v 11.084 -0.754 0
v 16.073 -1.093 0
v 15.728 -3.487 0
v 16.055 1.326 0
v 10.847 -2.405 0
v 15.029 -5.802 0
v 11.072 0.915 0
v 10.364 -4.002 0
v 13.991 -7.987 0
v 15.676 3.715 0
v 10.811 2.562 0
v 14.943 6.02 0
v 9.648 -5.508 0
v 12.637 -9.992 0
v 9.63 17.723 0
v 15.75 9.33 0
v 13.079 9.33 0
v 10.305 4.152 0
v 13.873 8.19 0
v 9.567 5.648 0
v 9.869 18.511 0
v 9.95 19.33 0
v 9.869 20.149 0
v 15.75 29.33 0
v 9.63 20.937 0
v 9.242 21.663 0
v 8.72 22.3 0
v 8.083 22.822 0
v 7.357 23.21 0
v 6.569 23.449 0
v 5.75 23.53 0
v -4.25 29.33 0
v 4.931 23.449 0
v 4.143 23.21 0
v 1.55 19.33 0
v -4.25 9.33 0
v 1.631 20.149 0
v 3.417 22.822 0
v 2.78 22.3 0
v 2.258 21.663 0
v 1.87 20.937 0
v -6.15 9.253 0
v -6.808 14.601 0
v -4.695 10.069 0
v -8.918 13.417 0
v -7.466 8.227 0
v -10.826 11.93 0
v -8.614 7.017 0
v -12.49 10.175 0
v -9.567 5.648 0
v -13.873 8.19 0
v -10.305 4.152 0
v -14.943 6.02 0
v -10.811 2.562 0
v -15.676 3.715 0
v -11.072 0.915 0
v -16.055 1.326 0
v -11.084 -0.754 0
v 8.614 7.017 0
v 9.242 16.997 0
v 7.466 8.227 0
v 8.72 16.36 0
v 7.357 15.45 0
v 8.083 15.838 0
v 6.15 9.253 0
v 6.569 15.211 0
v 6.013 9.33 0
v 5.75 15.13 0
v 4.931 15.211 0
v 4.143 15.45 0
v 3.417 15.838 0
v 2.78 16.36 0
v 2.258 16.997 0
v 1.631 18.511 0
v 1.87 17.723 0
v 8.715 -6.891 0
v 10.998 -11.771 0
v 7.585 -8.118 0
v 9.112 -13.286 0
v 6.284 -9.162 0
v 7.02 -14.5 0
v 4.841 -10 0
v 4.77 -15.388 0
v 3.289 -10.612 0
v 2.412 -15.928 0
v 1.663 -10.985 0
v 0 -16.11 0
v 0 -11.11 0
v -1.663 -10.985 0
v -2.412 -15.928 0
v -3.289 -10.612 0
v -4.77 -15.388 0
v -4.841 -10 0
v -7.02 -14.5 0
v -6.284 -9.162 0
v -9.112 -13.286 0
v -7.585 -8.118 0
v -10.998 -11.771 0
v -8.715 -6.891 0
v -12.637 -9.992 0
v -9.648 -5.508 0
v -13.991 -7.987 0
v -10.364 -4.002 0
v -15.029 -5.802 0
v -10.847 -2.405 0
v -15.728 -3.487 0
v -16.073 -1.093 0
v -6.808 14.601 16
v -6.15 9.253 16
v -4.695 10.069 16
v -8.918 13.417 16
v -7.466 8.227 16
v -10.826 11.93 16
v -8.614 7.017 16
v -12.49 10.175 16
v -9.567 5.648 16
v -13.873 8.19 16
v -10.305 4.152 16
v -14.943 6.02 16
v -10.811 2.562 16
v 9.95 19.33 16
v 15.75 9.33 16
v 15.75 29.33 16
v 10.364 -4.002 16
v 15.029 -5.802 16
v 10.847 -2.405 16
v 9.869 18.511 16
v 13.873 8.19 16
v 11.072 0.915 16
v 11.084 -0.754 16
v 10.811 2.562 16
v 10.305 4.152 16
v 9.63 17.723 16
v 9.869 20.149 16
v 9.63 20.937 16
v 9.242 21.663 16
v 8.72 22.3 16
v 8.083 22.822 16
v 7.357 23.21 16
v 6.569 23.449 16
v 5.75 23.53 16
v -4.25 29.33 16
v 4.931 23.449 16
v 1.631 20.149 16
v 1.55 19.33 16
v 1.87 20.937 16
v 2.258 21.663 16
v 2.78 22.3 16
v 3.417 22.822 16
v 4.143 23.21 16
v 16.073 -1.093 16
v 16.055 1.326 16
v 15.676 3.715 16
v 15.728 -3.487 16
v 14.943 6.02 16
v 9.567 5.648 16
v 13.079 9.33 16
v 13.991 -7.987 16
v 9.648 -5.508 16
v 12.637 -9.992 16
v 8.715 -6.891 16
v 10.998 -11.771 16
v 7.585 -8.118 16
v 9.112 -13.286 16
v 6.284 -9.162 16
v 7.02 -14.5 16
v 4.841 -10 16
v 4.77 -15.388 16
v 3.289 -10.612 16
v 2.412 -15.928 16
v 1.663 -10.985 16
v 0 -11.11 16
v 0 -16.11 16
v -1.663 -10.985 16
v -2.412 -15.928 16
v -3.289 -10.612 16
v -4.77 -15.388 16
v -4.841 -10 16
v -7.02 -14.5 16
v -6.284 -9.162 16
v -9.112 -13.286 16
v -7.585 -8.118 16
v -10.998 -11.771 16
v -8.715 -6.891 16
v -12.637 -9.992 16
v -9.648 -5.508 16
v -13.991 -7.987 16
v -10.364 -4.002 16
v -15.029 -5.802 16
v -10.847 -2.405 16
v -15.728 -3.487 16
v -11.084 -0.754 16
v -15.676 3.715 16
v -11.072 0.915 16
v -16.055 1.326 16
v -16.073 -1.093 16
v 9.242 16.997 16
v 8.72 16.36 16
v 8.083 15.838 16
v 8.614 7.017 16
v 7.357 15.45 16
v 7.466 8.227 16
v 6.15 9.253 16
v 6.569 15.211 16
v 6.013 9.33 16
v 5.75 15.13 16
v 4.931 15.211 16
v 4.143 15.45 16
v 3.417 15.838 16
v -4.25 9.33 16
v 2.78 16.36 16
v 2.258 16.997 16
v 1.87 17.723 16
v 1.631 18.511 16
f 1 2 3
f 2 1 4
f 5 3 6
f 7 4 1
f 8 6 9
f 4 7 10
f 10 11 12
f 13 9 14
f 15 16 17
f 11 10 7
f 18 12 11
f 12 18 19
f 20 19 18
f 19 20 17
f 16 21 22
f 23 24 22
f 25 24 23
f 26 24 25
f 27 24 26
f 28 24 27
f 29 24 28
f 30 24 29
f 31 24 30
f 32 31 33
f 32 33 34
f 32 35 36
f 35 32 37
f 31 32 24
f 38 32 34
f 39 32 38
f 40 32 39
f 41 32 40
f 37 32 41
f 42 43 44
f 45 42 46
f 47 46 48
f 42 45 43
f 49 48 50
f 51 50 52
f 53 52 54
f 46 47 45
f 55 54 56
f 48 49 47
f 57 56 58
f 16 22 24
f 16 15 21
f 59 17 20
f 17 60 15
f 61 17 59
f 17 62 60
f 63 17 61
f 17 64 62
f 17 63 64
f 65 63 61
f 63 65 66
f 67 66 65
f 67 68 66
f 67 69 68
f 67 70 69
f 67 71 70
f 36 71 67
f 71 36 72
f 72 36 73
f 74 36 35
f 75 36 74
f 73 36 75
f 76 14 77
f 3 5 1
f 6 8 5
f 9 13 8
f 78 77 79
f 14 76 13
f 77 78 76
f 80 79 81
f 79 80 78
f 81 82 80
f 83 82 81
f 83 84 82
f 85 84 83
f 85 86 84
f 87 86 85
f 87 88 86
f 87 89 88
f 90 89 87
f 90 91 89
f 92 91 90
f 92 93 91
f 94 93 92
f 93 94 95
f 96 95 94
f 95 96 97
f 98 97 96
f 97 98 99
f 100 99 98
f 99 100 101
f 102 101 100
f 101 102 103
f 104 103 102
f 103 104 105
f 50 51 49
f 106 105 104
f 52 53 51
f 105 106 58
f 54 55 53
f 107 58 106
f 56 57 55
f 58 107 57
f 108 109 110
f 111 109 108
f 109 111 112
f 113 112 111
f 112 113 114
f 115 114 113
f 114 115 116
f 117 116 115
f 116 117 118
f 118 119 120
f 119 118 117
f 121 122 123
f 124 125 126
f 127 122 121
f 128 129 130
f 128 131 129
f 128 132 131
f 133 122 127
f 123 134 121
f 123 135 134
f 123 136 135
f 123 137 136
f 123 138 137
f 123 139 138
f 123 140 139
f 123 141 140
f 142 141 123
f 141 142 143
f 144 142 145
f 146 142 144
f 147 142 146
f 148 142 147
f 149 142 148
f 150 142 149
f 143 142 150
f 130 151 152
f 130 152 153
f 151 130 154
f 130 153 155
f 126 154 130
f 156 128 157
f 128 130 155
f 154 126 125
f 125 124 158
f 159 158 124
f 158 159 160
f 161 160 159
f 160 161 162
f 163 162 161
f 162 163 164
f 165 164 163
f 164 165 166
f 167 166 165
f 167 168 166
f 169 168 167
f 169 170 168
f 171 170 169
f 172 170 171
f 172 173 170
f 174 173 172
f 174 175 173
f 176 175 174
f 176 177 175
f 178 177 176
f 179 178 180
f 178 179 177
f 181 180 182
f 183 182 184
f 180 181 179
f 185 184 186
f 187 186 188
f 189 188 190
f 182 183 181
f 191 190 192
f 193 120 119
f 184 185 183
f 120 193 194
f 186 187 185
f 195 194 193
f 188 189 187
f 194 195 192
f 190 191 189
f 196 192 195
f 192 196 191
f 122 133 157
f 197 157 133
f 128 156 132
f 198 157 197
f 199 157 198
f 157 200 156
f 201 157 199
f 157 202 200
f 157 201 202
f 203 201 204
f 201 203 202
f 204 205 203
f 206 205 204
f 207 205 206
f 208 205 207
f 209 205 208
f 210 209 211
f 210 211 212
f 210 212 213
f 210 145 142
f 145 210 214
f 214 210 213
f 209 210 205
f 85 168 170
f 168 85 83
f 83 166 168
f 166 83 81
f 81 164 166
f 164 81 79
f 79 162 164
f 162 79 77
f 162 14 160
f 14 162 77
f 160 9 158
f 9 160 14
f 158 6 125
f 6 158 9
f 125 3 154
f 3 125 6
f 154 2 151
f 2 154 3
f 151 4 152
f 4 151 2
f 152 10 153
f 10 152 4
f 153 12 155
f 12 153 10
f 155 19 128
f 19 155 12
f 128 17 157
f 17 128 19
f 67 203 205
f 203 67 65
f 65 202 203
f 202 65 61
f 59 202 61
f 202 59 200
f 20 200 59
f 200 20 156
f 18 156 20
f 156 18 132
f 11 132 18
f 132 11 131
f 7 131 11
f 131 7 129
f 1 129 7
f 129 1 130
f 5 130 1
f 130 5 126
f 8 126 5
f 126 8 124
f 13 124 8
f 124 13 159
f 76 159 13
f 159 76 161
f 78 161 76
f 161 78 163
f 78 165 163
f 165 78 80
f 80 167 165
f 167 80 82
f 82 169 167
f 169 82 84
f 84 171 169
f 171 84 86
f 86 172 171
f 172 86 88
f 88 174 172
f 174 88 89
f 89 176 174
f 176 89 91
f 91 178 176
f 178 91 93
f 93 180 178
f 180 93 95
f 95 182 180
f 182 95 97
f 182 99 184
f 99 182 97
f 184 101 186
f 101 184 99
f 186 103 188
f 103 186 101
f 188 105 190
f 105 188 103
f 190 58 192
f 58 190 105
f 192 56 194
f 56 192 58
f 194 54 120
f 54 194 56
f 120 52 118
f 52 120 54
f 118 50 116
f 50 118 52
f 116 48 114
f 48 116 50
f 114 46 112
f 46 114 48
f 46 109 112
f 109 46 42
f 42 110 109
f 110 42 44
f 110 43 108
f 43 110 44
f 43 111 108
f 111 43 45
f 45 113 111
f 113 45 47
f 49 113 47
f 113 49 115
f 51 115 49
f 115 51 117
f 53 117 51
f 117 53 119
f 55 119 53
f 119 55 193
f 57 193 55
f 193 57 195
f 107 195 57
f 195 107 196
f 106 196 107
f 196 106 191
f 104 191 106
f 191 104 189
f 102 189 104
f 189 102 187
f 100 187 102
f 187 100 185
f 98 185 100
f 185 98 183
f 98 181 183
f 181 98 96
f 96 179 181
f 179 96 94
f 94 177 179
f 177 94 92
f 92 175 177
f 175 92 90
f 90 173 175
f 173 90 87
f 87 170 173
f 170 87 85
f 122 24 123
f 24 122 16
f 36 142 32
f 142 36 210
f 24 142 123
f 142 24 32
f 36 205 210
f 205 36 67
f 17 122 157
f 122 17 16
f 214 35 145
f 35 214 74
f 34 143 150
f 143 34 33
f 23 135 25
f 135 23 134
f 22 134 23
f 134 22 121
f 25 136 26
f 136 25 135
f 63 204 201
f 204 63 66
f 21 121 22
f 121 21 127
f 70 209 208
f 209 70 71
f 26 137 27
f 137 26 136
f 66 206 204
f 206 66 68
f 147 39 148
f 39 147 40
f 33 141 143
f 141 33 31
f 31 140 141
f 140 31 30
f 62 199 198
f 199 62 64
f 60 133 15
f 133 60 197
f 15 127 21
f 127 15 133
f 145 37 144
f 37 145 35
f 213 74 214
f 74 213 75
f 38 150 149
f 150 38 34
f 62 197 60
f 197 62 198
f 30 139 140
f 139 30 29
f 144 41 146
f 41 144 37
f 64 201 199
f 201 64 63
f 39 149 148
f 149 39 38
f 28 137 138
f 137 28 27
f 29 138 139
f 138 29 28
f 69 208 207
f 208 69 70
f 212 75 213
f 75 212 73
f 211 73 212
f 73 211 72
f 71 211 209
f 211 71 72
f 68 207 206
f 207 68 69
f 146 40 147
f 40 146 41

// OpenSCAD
$fn = 32;

// ----------------------------------------------------------------------
// Pipe clamp: 32.22 mm ring, 5 mm wall, 16 mm wide
// ----------------------------------------------------------------------

// --- parameters (mm) ---
outer_r = 16.11;          // clamp outside radius
inner_r = 11.11;          // pipe bore radius
band = 5;                 // band thickness
clamp_w = 16;             // clamp width
opening = 50;             // opening angle between the ends
lug_w = 20;               // lug width
lug_len = 20;             // lug length
bolt_d = 8.4;             // bolt hole

clamp_profile = [[-6.808, 14.601], [-8.918, 13.417], [-10.826, 11.93], [-12.49, 10.175], [-13.873, 8.19], [-14.943, 6.02], [-15.676, 3.715], [-16.055, 1.326], [-16.073, -1.093], [-15.728, -3.487], [-15.029, -5.802], [-13.991, -7.987], [-12.637, -9.992], [-10.998, -11.771], [-9.112, -13.286], [-7.02, -14.5], [-4.77, -15.388], [-2.412, -15.928], [0, -16.11], [2.412, -15.928], [4.77, -15.388], [7.02, -14.5], [9.112, -13.286], [10.998, -11.771], [12.637, -9.992], [13.991, -7.987], [15.029, -5.802], [15.728, -3.487], [16.073, -1.093], [16.055, 1.326], [15.676, 3.715], [14.943, 6.02], [13.873, 8.19], [12.49, 10.175], [10.826, 11.93], [8.918, 13.417], [6.808, 14.601], [4.695, 10.069], [6.15, 9.253], [7.466, 8.227], [8.614, 7.017], [9.567, 5.648], [10.305, 4.152], [10.811, 2.562], [11.072, 0.915], [11.084, -0.754], [10.847, -2.405], [10.364, -4.002], [9.648, -5.508], [8.715, -6.891], [7.585, -8.118], [6.284, -9.162], [4.841, -10], [3.289, -10.612], [1.663, -10.985], [0, -11.11], [-1.663, -10.985], [-3.289, -10.612], [-4.841, -10], [-6.284, -9.162], [-7.585, -8.118], [-8.715, -6.891], [-9.648, -5.508], [-10.364, -4.002], [-10.847, -2.405], [-11.084, -0.754], [-11.072, 0.915], [-10.811, 2.562], [-10.305, 4.152], [-9.567, 5.648], [-8.614, 7.017], [-7.466, 8.227], [-6.15, 9.253], [-4.695, 10.069]];

difference() {
  union() {
    linear_extrude(height = clamp_w) polygon(clamp_profile);
    /* bolt lug on the other end */
    translate([-4.25, 9.33, 0]) cube([lug_w, 20, clamp_w]);
  }
  translate([5.75, 19.33, -2.5]) cylinder(h = clamp_w + 5, d = bolt_d);
}
